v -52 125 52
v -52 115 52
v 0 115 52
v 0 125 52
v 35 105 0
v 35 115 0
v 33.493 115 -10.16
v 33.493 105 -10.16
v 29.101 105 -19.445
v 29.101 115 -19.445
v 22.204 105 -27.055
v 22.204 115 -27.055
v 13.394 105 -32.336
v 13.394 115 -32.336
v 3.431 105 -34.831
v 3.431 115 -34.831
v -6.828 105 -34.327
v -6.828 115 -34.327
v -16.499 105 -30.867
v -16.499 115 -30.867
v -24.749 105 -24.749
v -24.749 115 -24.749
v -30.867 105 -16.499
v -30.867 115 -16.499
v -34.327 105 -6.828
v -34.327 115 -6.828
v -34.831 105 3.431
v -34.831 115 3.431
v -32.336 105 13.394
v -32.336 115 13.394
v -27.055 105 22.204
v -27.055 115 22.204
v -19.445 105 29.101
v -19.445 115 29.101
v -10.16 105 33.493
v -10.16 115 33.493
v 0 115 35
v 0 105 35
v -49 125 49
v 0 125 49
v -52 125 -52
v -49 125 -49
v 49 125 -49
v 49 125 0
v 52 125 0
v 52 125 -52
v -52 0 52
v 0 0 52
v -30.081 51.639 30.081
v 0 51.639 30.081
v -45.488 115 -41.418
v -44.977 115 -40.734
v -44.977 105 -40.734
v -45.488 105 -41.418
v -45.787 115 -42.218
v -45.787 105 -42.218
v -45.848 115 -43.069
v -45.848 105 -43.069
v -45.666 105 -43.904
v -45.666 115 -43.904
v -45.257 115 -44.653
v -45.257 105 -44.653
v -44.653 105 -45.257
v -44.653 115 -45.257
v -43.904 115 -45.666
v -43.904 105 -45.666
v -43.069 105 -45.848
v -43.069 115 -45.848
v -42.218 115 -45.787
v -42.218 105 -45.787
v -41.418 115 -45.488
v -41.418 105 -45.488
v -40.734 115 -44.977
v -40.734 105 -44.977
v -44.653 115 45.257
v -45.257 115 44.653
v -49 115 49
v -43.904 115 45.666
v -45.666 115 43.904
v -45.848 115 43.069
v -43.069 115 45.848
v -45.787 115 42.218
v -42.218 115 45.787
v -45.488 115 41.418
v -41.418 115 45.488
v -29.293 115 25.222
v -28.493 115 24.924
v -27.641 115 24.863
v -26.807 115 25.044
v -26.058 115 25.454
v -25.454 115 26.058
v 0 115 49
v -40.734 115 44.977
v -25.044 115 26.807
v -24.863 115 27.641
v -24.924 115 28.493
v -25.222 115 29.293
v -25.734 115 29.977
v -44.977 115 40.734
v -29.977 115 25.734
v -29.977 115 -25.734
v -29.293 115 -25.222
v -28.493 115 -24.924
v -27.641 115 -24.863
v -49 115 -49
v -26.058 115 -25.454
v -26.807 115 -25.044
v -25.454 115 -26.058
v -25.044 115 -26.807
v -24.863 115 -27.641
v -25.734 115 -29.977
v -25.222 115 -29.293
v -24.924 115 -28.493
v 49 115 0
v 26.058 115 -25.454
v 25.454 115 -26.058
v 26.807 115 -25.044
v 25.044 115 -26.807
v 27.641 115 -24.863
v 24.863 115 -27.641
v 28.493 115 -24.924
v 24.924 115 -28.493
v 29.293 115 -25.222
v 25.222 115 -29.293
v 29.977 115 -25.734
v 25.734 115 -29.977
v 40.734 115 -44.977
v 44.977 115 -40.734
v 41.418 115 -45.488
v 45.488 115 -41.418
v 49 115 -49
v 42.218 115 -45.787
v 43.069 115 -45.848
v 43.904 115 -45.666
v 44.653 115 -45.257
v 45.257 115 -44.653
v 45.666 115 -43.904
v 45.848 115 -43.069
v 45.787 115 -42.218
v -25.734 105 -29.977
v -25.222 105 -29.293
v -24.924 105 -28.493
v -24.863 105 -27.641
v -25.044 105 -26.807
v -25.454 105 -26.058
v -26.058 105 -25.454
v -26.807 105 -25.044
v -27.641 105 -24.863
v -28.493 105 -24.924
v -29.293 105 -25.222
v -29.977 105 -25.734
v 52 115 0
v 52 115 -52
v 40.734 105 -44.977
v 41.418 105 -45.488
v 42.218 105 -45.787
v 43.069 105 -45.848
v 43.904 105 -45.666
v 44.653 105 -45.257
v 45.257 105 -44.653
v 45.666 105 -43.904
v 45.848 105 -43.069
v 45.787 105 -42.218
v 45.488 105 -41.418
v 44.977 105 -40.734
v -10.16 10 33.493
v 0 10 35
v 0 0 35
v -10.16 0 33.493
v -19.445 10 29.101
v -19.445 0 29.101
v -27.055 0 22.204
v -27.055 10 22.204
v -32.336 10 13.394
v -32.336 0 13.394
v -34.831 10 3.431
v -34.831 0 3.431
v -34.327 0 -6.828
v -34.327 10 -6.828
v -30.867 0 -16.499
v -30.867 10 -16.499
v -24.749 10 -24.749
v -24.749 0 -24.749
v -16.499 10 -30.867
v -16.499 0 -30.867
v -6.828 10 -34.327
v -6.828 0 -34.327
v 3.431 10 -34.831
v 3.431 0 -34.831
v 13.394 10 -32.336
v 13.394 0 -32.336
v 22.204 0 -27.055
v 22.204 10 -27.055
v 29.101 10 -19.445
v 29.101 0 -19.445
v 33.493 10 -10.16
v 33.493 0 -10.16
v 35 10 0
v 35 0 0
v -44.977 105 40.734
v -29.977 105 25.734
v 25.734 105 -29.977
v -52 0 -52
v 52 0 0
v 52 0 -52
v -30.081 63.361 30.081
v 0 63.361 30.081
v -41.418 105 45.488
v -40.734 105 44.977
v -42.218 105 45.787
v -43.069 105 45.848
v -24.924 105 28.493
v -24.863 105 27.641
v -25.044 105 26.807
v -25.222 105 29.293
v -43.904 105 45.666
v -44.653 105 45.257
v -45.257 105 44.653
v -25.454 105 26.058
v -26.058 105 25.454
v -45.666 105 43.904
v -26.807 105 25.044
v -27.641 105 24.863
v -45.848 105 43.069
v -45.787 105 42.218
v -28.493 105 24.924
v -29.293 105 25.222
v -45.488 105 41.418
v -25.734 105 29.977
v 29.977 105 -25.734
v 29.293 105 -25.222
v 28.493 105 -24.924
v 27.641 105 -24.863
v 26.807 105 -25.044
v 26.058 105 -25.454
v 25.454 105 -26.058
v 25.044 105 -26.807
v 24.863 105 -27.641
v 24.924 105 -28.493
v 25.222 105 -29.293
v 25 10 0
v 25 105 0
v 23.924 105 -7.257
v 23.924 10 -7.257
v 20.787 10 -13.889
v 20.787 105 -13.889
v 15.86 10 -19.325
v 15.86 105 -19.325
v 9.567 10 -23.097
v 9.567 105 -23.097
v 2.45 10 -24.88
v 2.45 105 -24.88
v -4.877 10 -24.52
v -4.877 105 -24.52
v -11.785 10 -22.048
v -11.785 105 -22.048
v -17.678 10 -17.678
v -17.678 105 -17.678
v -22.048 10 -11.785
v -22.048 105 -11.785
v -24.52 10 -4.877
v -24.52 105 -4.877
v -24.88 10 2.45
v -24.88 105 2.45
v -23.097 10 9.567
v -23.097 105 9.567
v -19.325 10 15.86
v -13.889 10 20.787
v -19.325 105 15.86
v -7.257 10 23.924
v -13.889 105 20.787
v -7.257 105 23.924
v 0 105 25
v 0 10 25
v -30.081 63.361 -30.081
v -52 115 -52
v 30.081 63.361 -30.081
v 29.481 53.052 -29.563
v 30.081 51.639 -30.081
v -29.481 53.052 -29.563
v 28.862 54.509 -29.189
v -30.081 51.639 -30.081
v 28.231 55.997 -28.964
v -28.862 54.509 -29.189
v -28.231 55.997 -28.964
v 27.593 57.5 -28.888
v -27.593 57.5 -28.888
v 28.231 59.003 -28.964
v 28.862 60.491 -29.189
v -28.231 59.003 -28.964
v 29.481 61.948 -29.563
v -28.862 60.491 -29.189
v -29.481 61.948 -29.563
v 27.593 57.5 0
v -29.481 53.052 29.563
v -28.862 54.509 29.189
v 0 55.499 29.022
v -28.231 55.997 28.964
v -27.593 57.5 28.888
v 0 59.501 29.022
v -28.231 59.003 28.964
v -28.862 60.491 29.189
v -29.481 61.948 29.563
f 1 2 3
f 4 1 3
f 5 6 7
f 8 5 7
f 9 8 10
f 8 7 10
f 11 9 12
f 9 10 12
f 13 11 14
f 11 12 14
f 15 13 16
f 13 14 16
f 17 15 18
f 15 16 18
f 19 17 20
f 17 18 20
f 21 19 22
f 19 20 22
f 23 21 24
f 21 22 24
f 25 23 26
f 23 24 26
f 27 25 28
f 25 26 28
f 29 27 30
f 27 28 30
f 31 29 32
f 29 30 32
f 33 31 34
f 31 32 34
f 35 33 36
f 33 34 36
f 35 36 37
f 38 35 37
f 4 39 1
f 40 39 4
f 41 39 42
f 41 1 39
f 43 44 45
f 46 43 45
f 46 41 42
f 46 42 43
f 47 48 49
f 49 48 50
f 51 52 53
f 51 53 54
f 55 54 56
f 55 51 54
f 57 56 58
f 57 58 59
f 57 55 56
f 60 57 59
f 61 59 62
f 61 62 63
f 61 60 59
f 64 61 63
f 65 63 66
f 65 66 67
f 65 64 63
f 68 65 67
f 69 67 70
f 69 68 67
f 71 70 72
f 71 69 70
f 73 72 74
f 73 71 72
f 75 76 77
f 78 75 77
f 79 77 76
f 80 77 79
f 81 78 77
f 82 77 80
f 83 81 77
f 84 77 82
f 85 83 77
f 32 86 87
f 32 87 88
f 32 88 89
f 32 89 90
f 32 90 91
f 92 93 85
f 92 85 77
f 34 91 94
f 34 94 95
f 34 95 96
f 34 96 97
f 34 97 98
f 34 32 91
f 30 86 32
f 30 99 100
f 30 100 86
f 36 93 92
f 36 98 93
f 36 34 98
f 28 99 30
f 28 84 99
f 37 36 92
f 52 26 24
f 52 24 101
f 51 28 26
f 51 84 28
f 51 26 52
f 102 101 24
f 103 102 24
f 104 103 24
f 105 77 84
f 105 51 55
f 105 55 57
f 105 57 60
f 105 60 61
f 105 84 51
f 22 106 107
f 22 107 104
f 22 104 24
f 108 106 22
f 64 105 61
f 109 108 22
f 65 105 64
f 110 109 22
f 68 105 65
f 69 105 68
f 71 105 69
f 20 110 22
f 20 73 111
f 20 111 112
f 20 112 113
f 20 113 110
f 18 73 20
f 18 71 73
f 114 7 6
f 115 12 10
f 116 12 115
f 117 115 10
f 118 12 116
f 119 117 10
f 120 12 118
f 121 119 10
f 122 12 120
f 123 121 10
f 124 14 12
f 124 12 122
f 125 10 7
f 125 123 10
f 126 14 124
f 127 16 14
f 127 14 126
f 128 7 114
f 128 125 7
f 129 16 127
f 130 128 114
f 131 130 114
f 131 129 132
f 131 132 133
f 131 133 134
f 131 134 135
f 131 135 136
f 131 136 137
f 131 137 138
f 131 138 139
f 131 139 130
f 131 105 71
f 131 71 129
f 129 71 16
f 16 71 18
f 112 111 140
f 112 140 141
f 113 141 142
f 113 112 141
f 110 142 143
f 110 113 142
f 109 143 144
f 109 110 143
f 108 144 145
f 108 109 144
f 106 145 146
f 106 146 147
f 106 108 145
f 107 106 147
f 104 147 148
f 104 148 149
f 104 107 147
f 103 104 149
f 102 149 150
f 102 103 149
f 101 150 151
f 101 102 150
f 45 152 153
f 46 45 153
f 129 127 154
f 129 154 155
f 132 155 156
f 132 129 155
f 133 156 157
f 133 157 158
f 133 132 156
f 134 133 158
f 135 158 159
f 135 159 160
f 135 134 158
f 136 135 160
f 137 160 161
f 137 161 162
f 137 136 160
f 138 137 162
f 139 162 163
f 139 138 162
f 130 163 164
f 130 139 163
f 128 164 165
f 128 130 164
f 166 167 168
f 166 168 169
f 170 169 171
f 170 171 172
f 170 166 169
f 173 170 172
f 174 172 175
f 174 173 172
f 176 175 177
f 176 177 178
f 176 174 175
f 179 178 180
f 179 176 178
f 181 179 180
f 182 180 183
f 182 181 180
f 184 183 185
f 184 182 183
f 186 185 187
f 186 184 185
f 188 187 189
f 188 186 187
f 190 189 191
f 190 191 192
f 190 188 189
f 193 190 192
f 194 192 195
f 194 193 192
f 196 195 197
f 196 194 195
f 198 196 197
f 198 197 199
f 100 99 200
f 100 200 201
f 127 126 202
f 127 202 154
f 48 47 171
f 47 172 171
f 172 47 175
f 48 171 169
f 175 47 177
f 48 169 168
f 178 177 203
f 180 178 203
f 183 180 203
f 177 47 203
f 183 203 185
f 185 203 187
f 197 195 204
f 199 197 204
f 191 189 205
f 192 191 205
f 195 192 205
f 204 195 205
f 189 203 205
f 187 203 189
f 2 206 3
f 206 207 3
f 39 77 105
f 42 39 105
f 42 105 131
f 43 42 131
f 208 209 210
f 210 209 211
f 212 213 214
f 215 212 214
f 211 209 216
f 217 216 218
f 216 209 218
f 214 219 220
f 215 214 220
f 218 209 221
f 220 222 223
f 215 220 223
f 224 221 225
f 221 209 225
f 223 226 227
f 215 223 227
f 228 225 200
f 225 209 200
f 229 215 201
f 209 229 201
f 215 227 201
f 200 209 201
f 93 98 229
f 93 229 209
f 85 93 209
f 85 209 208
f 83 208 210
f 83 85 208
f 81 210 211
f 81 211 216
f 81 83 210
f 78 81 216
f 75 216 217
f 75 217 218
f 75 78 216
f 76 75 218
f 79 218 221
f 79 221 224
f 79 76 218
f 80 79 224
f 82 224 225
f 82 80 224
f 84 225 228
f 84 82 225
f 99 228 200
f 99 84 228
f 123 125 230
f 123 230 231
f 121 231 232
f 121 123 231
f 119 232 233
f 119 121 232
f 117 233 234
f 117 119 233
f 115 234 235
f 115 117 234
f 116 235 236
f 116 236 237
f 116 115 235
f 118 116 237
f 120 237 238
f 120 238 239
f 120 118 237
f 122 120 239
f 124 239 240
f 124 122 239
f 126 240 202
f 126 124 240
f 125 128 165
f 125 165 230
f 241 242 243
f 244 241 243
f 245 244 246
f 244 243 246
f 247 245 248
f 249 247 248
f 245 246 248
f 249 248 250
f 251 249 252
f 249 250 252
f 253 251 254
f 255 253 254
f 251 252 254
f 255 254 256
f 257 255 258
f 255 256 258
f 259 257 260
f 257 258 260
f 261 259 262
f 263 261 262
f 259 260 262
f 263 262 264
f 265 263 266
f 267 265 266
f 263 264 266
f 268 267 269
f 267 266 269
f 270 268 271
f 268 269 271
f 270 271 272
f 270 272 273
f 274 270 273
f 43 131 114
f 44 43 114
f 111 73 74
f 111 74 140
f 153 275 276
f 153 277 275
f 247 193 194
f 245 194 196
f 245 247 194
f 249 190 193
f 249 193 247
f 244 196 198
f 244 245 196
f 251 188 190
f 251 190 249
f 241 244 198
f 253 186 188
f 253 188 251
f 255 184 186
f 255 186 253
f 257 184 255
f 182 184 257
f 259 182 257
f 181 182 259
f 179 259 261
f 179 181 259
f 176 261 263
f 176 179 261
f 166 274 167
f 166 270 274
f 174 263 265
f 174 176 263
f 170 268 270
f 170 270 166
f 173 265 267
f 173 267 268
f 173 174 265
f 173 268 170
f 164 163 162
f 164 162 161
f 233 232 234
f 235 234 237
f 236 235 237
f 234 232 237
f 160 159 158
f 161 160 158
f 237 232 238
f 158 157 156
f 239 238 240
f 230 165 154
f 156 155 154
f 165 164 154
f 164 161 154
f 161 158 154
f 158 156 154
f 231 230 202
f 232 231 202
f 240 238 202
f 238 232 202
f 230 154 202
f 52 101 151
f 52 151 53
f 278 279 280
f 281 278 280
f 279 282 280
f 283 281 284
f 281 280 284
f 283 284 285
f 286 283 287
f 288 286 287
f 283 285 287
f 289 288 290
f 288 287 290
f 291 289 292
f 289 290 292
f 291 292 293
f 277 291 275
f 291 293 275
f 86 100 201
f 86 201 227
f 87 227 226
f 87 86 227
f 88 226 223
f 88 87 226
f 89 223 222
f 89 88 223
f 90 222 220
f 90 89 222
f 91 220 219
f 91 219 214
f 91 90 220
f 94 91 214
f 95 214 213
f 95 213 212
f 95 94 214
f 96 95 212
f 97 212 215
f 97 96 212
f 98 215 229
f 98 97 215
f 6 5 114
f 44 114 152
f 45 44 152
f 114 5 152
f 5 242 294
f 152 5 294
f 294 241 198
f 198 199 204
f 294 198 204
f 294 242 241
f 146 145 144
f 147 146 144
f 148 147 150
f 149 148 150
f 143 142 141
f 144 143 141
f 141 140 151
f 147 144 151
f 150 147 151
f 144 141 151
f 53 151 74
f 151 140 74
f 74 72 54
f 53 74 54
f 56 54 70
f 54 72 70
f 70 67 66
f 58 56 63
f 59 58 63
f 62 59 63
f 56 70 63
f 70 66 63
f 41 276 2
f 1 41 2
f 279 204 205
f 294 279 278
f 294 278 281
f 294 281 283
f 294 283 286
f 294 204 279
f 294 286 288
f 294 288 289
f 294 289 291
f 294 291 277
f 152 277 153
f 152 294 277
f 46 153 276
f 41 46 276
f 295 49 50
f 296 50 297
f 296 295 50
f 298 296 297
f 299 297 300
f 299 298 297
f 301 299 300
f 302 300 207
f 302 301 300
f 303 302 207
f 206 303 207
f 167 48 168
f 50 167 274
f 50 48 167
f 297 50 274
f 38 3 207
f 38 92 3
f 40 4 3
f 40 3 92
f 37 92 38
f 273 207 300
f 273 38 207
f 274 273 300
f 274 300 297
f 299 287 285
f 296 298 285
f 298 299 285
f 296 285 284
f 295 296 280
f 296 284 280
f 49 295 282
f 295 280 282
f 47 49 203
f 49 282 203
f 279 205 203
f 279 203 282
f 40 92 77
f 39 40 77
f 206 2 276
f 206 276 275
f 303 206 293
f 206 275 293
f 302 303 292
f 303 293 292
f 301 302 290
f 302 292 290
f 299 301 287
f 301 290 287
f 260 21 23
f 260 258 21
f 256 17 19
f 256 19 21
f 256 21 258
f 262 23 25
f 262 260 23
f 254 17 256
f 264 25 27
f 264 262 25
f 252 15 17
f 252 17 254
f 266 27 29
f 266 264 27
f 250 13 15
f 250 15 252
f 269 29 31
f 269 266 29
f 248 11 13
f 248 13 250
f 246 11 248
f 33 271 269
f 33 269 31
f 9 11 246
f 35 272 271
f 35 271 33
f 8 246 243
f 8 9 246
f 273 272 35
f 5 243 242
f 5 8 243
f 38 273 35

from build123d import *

# Parameters (mm, degrees)
SKETCH1_W           = 104
SKETCH1_H           = 104
BOSS_EXTRUDE1_DEPTH = 115
CUT_EXTRUDE1_DEPTH  = 164.538986178
CUT_EXTRUDE2_DEPTH  = 57.5
SKETCH4_R           = 25
CUT_EXTRUDE3_DEPTH  = 137.502747225
SKETCH5_R           = 35
CUT_EXTRUDE4_DEPTH  = 10
CUT_EXTRUDE5_START  = -10
SKETCH6_R           = 35
CUT_EXTRUDE5_DEPTH  = 10
SKETCH7_W           = 52
SKETCH7_H           = 52
CUT_EXTRUDE6_DEPTH  = 137.502747225
FILLET2_R           = 15
FILLET3_R           = 15
BOSS_EXTRUDE2_DEPTH = 10
CUT_EXTRUDE7_DEPTH  = 10


with BuildPart() as part:
    # Sketch1 → Boss-Extrude1 (new body)
    with BuildSketch(Plane(origin=(0, 0, 0), x_dir=(1, 0, 0), z_dir=(0, 1, 0))):
        Rectangle(SKETCH1_W, SKETCH1_H)
    extrude(amount=BOSS_EXTRUDE1_DEPTH)

    # Sketch2 → Cut-Extrude1 (cut, through all)
    with BuildSketch(Plane(origin=(52, 0, 0), x_dir=(0, 0, -1), z_dir=(1, 0, 0))):
        Polygon((-52, 115), (-52, 0), (-27.592698068, 57.5), align=None)
        Polygon((52, 115), (52, 0), (27.592698068, 57.5), align=None)
    extrude(amount=-CUT_EXTRUDE1_DEPTH, mode=Mode.SUBTRACT)

    # Sketch3 → Cut-Extrude2 (cut, symmetric)
    with BuildSketch(Plane.XY):
        Polygon((-52, 115), (-27.592698068, 57.5), (-52, 0), align=None)
        Polygon((52, 0), (27.592698068, 57.5), (52, 115), align=None)
    extrude(amount=CUT_EXTRUDE2_DEPTH, both=True, mode=Mode.SUBTRACT)

    # Sketch4 → Cut-Extrude3 (cut, through all)
    with BuildSketch(Plane(origin=(0, 115, 0), x_dir=(1, 0, 0), z_dir=(0, 1, 0))):
        with Locations(Location((0, 0, 0), (0, 0, 270))):
            Circle(SKETCH4_R)
    extrude(amount=-CUT_EXTRUDE3_DEPTH, mode=Mode.SUBTRACT)

    # Sketch5 → Cut-Extrude4 (cut)
    with BuildSketch(Plane(origin=(0, 115, 0), x_dir=(1, 0, 0), z_dir=(0, 1, 0))):
        with Locations(Location((0, 0, 0), (0, 0, 270))):
            Circle(SKETCH5_R)
    extrude(amount=-CUT_EXTRUDE4_DEPTH, mode=Mode.SUBTRACT)

    # Sketch6 → Cut-Extrude5 (cut)
    with BuildSketch(Plane.XZ.offset(CUT_EXTRUDE5_START)):
        with Locations(Location((0, 0, 0), (0, 0, 90))):
            Circle(SKETCH6_R)
    extrude(amount=CUT_EXTRUDE5_DEPTH, mode=Mode.SUBTRACT)

    # Sketch7 → Cut-Extrude6 (cut, through all)
    with BuildSketch(Plane(origin=(0, 115, 0), x_dir=(1, 0, 0), z_dir=(0, 1, 0))):
        with Locations((26, -26)):
            Rectangle(SKETCH7_W, SKETCH7_H)
    extrude(amount=-CUT_EXTRUDE6_DEPTH, mode=Mode.SUBTRACT)

    # Fillet2
    fillet2_edges = [part.edges().sort_by_distance(p)[0] for p in [
        (0, 57.5, -27.592698068),
    ]]
    fillet(fillet2_edges, radius=FILLET2_R)

    # Fillet3
    fillet3_edges = [part.edges().sort_by_distance(p)[0] for p in [
        (-13.796349034, 57.5, 27.592698068),
    ]]
    fillet(fillet3_edges, radius=FILLET3_R)

    # Sketch8 → Boss-Extrude2 (add)
    with BuildSketch(Plane(origin=(0, 115, 0), x_dir=(1, 0, 0), z_dir=(0, 1, 0))):
        Polygon((-49, 49), (49, 49), (49, 0), (52, 0), (52, 52), (-52, 52), (-52, -52), (0, -52), (0, -49), (-49, -49), align=None)
    extrude(amount=BOSS_EXTRUDE2_DEPTH)

    # Sketch9 → Cut-Extrude7 (cut)
    with BuildSketch(Plane(origin=(0, 115, 0), x_dir=(1, 0, 0), z_dir=(0, 1, 0))):
        with BuildLine():
            Line((-40.734018716, 44.976659403), (-25.734018716, 29.976659403))
            ThreePointArc((-25.734018716, 29.976659403), (-25.734018716, 25.734018716), (-29.976659403, 25.734018716))
            Line((-29.976659403, 25.734018716), (-44.976659403, 40.734018716))
            ThreePointArc((-44.976659403, 40.734018716), (-44.976659403, 44.976659403), (-40.734018716, 44.976659403))
        make_face()
        with BuildLine():
            Line((44.976659403, 40.734018716), (29.976659403, 25.734018716))
            ThreePointArc((29.976659403, 25.734018716), (25.734018716, 25.734018716), (25.734018716, 29.976659403))
            Line((25.734018716, 29.976659403), (40.734018716, 44.976659403))
            ThreePointArc((40.734018716, 44.976659403), (44.976659403, 44.976659403), (44.976659403, 40.734018716))
        make_face()
        with BuildLine():
            Line((-44.976659403, -40.734018716), (-29.976659403, -25.734018716))
            ThreePointArc((-29.976659403, -25.734018716), (-25.734018716, -25.734018716), (-25.734018716, -29.976659403))
            Line((-25.734018716, -29.976659403), (-40.734018716, -44.976659403))
            ThreePointArc((-40.734018716, -44.976659403), (-44.976659403, -44.976659403), (-44.976659403, -40.734018716))
        make_face()
    extrude(amount=-CUT_EXTRUDE7_DEPTH, mode=Mode.SUBTRACT)


solid = part.part
